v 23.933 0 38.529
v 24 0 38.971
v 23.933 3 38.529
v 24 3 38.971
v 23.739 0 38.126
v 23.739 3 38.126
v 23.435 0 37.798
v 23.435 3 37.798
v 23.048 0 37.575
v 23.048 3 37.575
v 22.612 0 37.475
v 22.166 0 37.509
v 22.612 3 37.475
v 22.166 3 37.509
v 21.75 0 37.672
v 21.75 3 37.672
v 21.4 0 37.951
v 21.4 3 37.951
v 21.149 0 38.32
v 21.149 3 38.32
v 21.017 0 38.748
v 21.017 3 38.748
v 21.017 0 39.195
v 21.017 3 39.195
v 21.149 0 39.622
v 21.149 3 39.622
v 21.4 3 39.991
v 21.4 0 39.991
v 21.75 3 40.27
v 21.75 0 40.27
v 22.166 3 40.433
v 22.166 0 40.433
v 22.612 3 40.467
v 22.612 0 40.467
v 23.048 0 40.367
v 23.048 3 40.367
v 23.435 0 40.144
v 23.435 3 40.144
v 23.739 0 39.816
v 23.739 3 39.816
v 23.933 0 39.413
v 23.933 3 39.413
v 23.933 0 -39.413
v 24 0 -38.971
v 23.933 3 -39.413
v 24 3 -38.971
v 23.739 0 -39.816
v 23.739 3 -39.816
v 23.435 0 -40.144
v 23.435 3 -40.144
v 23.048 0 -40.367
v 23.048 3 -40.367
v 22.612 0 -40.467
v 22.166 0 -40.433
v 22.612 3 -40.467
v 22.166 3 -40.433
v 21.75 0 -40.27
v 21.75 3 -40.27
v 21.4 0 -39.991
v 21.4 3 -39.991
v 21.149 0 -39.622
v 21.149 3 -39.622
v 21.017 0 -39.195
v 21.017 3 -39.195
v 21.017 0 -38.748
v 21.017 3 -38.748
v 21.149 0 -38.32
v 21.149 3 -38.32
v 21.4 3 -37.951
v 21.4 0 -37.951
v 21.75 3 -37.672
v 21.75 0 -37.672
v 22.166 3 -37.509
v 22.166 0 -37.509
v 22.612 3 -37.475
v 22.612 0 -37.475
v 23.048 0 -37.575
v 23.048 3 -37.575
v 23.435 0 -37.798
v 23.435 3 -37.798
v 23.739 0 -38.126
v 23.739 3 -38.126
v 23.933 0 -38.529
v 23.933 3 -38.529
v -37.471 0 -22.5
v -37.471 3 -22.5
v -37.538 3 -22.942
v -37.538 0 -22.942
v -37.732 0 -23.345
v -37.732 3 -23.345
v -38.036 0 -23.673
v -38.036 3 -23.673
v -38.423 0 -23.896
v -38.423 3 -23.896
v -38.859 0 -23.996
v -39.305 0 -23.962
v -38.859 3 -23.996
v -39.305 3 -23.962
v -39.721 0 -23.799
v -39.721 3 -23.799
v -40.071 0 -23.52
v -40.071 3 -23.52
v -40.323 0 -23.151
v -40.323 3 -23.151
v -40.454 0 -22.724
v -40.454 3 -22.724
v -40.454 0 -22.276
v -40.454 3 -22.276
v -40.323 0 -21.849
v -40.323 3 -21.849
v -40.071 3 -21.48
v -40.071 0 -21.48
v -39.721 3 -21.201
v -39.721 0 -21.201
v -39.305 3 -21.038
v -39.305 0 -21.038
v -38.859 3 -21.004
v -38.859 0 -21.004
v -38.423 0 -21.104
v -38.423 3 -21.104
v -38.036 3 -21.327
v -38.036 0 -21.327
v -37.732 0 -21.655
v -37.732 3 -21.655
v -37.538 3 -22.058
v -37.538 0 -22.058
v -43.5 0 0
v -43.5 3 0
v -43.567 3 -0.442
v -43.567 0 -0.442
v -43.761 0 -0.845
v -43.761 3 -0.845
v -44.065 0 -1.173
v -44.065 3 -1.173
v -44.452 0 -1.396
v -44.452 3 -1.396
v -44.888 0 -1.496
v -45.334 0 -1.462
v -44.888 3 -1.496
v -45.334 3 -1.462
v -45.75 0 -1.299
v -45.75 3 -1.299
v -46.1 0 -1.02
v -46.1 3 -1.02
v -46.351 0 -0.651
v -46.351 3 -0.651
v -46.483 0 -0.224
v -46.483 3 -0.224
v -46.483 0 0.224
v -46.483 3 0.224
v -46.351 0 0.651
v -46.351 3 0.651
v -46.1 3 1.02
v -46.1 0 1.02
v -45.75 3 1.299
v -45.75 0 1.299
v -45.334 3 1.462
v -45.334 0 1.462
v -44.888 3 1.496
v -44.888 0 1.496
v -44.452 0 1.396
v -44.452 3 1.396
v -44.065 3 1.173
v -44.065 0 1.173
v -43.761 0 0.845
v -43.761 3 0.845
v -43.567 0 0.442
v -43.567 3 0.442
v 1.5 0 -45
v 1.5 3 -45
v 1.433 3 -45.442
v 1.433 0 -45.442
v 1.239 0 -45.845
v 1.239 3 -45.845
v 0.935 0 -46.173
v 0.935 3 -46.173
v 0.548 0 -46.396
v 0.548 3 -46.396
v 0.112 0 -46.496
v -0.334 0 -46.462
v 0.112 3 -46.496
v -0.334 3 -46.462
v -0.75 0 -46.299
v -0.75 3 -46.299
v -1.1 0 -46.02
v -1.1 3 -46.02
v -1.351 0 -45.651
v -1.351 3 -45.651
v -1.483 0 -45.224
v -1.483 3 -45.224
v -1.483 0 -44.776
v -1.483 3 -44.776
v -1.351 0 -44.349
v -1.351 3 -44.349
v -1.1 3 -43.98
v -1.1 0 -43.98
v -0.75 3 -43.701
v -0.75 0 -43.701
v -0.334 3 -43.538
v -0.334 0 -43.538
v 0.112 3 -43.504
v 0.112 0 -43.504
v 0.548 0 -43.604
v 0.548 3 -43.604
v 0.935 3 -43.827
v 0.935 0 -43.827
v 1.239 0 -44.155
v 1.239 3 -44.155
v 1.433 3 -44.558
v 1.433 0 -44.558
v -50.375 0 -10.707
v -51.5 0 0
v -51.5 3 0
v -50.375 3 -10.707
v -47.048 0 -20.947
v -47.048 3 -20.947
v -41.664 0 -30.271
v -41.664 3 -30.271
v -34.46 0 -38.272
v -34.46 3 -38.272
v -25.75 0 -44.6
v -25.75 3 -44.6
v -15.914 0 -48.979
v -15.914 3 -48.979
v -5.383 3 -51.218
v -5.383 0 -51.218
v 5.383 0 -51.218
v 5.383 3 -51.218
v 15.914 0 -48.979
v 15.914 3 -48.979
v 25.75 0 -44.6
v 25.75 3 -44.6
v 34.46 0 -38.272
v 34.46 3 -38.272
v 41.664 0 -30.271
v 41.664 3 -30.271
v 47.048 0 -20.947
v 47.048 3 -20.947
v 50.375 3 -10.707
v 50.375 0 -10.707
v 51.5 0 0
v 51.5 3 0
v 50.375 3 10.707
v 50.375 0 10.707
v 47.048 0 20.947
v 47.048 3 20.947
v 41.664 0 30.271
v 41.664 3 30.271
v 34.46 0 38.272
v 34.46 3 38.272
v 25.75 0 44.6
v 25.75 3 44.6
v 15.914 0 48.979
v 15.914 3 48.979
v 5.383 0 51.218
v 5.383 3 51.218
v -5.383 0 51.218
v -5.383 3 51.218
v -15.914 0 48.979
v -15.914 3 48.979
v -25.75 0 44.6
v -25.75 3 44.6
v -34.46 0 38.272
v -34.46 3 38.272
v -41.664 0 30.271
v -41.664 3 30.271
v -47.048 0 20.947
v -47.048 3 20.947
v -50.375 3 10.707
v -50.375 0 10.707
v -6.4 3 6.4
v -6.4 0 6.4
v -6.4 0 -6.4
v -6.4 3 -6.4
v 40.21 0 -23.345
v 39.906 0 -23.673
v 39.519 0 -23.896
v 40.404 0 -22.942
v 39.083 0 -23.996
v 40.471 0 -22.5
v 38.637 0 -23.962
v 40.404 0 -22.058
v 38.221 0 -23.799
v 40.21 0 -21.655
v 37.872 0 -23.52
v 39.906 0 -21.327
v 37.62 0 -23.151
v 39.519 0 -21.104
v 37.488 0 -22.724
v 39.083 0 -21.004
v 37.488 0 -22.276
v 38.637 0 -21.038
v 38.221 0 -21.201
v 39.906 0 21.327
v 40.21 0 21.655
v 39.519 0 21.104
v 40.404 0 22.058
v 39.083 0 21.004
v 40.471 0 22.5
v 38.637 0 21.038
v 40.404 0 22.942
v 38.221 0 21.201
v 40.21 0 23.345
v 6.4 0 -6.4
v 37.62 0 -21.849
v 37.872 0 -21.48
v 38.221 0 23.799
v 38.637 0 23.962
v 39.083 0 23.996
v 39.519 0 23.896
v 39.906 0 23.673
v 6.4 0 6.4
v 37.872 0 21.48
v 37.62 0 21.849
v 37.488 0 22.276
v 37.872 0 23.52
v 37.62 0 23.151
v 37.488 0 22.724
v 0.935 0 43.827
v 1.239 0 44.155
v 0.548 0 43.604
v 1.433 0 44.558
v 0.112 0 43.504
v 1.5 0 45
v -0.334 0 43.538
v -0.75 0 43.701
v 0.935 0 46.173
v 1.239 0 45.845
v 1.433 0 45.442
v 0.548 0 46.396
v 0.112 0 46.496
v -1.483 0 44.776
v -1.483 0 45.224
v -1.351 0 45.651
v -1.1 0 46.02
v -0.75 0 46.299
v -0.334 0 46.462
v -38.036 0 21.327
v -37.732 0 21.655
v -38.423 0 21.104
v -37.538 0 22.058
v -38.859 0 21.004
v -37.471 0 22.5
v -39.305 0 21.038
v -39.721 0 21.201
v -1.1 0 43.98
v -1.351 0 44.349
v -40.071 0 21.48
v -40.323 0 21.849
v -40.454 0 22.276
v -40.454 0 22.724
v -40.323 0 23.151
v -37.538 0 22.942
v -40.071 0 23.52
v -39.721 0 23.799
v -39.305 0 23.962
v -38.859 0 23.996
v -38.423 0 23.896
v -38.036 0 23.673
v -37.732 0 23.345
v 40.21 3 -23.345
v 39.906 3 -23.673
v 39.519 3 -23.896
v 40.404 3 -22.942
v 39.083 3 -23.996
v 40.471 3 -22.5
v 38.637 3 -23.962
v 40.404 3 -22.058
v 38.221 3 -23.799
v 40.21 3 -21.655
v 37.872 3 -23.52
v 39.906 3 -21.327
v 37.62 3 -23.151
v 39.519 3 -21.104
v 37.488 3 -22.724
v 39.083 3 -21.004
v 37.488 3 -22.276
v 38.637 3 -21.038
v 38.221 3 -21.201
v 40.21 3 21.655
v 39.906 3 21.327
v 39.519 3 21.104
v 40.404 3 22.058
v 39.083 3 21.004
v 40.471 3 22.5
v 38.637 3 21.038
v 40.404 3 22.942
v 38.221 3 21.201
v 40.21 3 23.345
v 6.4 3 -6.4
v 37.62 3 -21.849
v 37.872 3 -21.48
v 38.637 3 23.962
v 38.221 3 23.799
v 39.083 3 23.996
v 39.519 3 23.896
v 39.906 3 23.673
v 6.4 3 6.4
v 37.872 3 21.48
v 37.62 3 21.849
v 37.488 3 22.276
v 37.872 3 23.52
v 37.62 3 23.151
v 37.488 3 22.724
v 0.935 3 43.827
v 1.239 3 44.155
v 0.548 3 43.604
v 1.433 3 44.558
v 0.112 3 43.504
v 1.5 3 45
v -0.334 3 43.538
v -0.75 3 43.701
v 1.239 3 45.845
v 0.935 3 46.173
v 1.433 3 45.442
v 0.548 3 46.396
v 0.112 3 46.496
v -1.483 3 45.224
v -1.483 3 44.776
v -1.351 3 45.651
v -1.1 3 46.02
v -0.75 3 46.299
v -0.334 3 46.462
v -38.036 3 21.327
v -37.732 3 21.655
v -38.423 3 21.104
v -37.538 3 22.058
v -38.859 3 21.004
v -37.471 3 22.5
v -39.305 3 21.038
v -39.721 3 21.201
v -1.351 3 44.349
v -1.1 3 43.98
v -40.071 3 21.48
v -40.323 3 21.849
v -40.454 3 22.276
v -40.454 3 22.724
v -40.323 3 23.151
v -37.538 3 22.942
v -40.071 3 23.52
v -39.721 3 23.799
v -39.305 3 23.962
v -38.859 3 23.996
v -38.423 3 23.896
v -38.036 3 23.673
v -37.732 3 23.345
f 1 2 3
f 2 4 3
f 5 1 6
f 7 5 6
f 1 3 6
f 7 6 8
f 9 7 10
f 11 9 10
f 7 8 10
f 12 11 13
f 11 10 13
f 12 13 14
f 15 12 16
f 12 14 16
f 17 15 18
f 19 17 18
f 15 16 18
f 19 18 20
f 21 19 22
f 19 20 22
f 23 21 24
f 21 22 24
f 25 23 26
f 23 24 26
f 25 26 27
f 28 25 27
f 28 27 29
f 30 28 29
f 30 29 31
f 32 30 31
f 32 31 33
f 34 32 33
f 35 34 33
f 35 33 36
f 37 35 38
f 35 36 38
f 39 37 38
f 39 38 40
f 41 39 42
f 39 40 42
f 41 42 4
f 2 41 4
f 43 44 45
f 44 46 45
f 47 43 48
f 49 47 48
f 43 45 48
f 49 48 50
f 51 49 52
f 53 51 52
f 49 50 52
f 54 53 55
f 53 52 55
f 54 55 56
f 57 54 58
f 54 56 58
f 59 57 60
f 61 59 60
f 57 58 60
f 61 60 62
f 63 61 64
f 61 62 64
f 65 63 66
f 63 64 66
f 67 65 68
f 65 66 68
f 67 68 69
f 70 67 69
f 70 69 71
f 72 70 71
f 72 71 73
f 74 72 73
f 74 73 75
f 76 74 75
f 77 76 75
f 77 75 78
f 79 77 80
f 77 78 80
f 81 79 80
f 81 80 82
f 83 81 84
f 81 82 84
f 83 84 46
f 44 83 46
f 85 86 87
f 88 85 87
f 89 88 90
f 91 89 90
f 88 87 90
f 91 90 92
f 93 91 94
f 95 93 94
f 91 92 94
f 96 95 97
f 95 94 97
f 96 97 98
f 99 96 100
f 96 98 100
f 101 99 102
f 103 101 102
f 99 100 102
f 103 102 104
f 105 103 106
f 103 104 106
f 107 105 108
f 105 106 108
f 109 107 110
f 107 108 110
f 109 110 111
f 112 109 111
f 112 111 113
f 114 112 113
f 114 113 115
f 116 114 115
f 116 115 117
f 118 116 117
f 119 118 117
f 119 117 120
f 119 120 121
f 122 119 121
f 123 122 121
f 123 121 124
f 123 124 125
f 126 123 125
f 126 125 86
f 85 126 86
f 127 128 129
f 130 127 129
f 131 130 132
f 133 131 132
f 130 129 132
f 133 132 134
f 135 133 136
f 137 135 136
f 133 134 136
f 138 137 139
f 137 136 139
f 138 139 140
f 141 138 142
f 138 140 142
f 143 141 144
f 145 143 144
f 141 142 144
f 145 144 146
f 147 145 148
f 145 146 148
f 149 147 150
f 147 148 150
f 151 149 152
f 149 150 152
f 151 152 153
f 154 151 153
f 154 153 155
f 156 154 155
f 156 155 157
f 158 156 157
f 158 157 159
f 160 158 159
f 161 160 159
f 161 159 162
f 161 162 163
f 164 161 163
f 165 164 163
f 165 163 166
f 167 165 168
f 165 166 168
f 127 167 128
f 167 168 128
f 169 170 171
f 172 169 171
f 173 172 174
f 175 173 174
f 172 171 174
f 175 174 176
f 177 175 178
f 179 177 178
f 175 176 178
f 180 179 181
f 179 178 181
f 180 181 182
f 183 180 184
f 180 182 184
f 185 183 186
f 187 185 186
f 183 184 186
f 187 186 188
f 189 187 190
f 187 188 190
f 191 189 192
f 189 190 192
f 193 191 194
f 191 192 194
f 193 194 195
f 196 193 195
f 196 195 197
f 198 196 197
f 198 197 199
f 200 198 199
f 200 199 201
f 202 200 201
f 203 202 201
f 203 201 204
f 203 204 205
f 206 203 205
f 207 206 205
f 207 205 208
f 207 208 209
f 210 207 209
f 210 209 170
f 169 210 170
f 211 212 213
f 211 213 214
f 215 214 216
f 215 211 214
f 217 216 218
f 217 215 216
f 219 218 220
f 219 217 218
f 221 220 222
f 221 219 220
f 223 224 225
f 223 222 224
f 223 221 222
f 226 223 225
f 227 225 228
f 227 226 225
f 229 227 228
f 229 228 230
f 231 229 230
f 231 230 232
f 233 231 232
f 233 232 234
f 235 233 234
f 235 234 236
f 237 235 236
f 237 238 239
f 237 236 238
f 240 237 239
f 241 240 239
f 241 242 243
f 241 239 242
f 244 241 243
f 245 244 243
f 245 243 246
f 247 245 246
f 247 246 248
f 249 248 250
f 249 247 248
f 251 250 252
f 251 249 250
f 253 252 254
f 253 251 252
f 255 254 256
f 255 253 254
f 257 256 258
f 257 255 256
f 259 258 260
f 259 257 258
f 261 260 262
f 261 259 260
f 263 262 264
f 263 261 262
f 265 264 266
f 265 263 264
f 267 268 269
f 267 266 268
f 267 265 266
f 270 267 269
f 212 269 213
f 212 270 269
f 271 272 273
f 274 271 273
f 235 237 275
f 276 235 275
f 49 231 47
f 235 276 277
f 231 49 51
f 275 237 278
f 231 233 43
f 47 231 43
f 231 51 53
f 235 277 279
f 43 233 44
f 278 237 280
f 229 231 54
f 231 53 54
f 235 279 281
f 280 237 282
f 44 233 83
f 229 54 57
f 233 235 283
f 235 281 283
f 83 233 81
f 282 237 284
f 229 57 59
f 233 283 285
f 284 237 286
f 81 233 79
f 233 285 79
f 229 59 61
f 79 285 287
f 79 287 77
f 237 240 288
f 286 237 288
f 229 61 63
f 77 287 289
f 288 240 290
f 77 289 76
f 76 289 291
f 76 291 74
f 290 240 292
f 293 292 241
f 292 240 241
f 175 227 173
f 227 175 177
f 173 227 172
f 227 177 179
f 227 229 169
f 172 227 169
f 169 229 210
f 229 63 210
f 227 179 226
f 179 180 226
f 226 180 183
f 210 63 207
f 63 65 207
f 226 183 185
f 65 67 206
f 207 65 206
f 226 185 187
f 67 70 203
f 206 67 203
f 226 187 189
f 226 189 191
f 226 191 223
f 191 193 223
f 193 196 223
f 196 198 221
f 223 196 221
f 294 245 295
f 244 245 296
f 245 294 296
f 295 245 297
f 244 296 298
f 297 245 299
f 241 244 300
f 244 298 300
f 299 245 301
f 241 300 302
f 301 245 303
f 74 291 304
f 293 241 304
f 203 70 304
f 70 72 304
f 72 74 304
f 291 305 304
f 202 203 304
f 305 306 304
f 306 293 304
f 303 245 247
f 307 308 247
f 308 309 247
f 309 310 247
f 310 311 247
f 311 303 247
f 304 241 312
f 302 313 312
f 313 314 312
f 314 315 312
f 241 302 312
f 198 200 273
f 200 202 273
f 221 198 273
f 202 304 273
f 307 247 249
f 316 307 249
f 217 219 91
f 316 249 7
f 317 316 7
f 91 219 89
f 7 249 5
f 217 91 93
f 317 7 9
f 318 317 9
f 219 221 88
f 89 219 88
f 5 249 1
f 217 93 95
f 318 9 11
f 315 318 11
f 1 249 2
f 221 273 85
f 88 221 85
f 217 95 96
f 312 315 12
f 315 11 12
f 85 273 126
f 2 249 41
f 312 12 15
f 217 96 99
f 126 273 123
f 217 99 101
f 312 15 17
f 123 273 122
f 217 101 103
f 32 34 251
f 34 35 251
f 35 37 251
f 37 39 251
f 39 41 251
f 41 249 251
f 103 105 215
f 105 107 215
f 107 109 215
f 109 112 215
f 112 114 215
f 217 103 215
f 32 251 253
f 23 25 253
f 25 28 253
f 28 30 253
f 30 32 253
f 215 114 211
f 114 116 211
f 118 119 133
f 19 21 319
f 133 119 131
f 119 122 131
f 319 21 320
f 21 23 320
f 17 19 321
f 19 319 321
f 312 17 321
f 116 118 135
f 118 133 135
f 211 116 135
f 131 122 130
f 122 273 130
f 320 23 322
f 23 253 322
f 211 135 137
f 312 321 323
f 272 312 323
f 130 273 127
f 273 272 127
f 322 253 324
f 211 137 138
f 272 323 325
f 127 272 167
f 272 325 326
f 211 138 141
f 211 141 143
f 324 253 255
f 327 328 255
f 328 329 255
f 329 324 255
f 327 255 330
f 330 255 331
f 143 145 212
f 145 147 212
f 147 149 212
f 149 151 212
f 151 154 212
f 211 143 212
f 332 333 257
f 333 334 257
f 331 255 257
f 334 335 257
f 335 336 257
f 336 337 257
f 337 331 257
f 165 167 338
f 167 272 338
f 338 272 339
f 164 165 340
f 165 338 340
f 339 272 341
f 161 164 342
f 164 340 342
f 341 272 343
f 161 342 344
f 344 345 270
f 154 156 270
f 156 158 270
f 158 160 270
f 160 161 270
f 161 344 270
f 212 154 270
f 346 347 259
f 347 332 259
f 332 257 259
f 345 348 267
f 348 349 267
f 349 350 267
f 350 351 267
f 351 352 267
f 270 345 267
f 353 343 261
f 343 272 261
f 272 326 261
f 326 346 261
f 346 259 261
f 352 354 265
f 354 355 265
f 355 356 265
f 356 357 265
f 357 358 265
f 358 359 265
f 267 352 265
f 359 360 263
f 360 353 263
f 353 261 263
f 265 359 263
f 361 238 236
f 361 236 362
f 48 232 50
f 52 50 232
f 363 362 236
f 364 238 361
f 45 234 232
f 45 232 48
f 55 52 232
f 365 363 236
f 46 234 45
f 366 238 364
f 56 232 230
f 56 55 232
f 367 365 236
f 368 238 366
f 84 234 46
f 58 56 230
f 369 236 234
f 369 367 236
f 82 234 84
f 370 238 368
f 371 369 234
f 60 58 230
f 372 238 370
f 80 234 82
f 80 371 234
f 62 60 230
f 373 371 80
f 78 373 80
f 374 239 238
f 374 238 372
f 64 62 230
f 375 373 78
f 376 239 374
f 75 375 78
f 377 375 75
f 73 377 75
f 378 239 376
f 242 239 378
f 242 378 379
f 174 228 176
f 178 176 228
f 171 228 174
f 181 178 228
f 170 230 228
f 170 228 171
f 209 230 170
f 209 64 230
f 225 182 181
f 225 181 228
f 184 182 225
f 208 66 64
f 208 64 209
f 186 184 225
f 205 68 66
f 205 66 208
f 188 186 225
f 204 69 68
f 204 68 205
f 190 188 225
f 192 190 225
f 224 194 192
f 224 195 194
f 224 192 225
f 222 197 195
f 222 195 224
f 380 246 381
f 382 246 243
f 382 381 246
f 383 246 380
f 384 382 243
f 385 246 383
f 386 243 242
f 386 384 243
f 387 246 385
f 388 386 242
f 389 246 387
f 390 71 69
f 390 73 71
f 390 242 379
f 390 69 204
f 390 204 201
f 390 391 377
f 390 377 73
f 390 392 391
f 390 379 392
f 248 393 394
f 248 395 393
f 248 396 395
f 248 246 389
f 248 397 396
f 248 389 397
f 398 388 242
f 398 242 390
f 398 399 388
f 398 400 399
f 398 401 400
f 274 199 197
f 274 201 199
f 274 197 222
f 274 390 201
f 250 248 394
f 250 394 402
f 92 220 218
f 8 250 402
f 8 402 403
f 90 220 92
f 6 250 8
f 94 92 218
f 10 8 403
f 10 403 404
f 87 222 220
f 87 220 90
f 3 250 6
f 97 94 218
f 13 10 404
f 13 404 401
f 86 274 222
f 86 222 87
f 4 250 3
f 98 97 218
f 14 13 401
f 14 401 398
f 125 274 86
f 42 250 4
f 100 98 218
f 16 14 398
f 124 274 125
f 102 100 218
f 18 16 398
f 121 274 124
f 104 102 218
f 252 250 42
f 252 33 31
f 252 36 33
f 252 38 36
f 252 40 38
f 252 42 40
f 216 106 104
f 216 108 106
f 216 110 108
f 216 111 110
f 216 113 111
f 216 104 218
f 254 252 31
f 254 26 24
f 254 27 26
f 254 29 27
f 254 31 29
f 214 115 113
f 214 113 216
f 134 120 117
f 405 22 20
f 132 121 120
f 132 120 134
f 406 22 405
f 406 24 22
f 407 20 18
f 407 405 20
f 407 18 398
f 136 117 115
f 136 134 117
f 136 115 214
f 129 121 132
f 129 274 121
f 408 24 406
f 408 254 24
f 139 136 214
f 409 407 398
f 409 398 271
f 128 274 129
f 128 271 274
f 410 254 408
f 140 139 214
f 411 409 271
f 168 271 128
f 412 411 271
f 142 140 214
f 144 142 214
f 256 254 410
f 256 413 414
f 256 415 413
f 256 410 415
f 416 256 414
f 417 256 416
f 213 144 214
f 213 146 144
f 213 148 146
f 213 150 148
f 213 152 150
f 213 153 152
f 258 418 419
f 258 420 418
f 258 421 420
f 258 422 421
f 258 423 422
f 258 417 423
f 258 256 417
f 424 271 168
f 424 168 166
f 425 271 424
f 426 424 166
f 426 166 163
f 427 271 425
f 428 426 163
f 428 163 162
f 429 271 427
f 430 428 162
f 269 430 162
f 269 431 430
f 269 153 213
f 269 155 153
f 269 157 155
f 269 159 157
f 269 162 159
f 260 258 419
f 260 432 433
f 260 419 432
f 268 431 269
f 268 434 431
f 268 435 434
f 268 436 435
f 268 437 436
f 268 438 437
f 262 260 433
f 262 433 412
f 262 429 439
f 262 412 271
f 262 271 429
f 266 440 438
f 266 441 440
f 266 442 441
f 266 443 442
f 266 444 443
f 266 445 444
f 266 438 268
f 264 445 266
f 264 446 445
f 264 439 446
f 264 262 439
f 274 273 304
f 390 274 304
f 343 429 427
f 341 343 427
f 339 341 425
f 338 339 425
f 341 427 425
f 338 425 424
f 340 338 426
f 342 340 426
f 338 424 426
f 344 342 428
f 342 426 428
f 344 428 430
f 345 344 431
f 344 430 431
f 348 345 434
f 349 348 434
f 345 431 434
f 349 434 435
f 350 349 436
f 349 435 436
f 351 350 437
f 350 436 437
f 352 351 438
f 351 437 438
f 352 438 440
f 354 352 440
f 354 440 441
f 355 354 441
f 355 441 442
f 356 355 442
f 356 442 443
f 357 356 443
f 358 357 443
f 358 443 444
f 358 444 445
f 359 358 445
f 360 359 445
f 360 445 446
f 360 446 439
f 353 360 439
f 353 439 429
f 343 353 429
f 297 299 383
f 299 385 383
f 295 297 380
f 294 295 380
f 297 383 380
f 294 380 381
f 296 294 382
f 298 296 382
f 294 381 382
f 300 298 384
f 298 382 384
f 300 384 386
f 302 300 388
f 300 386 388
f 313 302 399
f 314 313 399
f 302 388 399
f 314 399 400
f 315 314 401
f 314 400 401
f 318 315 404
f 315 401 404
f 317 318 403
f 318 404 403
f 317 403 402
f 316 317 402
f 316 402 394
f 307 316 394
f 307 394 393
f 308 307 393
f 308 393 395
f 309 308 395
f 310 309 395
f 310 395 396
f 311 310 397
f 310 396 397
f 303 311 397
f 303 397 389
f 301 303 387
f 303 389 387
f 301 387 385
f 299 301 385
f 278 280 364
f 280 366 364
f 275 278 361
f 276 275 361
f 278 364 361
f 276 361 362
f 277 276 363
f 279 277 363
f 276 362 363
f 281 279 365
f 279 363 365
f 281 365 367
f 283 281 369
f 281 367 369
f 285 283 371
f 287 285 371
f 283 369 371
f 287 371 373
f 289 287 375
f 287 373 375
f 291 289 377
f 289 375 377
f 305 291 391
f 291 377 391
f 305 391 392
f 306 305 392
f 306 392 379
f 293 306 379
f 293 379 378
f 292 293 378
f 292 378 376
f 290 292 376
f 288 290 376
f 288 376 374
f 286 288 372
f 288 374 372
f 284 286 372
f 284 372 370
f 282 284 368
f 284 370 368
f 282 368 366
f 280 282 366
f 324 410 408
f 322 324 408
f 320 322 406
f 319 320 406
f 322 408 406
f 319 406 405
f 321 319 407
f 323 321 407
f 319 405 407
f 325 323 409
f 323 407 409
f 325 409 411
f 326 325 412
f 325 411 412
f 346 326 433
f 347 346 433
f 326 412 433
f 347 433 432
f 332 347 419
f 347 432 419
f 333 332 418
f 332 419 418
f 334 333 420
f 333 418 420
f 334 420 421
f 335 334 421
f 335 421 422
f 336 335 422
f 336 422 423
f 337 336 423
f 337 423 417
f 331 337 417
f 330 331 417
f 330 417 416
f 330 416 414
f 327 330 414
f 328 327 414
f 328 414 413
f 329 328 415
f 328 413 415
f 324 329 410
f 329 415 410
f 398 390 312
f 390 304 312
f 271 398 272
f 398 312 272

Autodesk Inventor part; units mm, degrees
ref_plane "YZ Plane" through (0, 0, 0) normal (1, 0, 0) x (0, 1, 0)
ref_plane "XZ Plane" through (0, 0, 0) normal (0, 1, 0) x (-1, 0, 0)
ref_plane "XY Plane" through (0, 0, 0) normal (0, 0, 1) x (1, 0, 0)
sketch "Sketch1" plane through (0, 0, 0) normal (0, 1, 0) x (-1, 0, 0)
  circle A0 centre (0, 0) radius 51.5
  line L0 (-6.4, 6.4) -> (6.4, 6.4)
  line L1 (6.4, 6.4) -> (6.4, -6.4)
  line L2 (6.4, -6.4) -> (-6.4, -6.4)
  line L3 (-6.4, -6.4) -> (-6.4, 6.4)
  line L4 (-6.4, 6.4) -> (6.4, -6.4) construction
  line L5 (6.4, 6.4) -> (-6.4, -6.4) construction
  dimension "d0" = 103
  dimension "d1" = 12.8
  dimension "d2" = 12.8
extrude "Extrusion1" add sketch "Sketch1" along normal blind 3
sketch "Sketch2" plane through (0, 3, 0) normal (0, 1, 0) x (1, 0, 0)
  line L0 (-6.4, -6.4) -> (-6.4, 6.4) construction
  line L1 (-6.4, 6.4) -> (6.4, 6.4) construction
  line L2 (6.4, 6.4) -> (6.4, -6.4) construction
  line L3 (6.4, -6.4) -> (-6.4, -6.4) construction
  circle A0 centre (0, 0) radius 51.5 construction
  line L4 (6.4, 0) -> (51.5, 0) construction
  circle A1 centre (0, 0) radius 51.5 construction
  line L5 (0, 0) -> (-25.75, 44.6003) construction
  line L6 (0, 0) -> (-25.75, -44.6003) construction
  circle A2 centre (0, 0) radius 45 construction
  line L7 (0, 0) -> (0, -51.5) construction
  line L8 (0, 0) -> (44.6003, -25.75) construction
  line L9 (0, 0) -> (25.75, -44.6003) construction
  line L10 (0, 0) -> (25.75, 44.6003) construction
  line L11 (44.6003, 25.75) -> (0, 0) construction
  line L12 (0, 0) -> (0, 51.5) construction
  line L13 (0, 0) -> (-44.6003, -25.75) construction
  line L14 (0, 0) -> (-51.5, 0) construction
  line L15 (0, 0) -> (-44.6003, 25.75) construction
  circle A3 centre (38.9711, -22.5) radius 1.5
  circle A4 centre (22.5, -38.9711) radius 1.5
  circle A5 centre (0, -45) radius 1.5
  circle A6 centre (-38.9711, -22.5) radius 1.5
  circle A7 centre (-45, 0) radius 1.5
  circle A8 centre (-38.9711, 22.5) radius 1.5
  circle A9 centre (22.5, 38.9711) radius 1.5
  circle A10 centre (38.9711, 22.5) radius 1.5
  circle A11 centre (0, 45) radius 1.5
  dimension "d7" = 90
  dimension "d5" = 120
  dimension "d6" = 120
  dimension "d8" = 30
  dimension "d9" = 30
  dimension "d10" = 30
  dimension "d11" = 30
  dimension "d12" = 30
  dimension "d13" = 30
  dimension "d14" = 30
  dimension "d15" = 30
  dimension "d16" = 3
  dimension "d17" = 3
  dimension "d18" = 3
  dimension "d19" = 3
  dimension "d20" = 3
  dimension "d21" = 3
  dimension "d22" = 3
  dimension "d23" = 3
  dimension "d24" = 3
extrude "Extrusion2" cut sketch "Sketch2" against normal blind 3
sketch "Sketch3" plane through (0, 0, 0) normal (0, -1, 0) x (1, 0, 0)
  circle A0 centre (38.9711, -22.5) radius 1.5 projected
  circle A1 centre (-38.9711, -22.5) radius 1.5 projected
  circle A2 centre (-38.9711, 22.5) radius 1.5 projected
  circle A3 centre (22.5, 38.9711) radius 1.5 projected
  circle A4 centre (38.9711, 22.5) radius 1.5 projected
  circle A5 centre (0, 45) radius 1.5 projected
  circle A6 centre (-45, 0) radius 1.5 projected
  circle A7 centre (22.5, -38.9711) radius 1.5 projected
  circle A8 centre (0, -45) radius 1.5 projected
  line L0 (-6.4, -6.4) -> (-6.4, 6.4) projected
  line L1 (-6.4, 6.4) -> (6.4, 6.4) projected
  line L2 (6.4, 6.4) -> (6.4, -6.4) projected
  line L3 (6.4, -6.4) -> (-6.4, -6.4) projected
  circle A9 centre (0, 0) radius 51.5 projected
equation "\"d2\" = d1"
equation "\"d9\" = d8"
equation "\"d10\" = d8"
equation "\"d11\" = d8"
equation "\"d12\" = d8"
equation "\"d13\" = d8"
equation "\"d14\" = d8"
equation "\"d15\" = d8"
equation "\"d17\" = d16"
equation "\"d18\" = d16"
equation "\"d19\" = d16"
equation "\"d20\" = d16"
equation "\"d21\" = d16"
equation "\"d22\" = d16"
equation "\"d23\" = d16"
equation "\"d24\" = d16"
properties part number "top top plate" material "Polycarbonate, Clear"
